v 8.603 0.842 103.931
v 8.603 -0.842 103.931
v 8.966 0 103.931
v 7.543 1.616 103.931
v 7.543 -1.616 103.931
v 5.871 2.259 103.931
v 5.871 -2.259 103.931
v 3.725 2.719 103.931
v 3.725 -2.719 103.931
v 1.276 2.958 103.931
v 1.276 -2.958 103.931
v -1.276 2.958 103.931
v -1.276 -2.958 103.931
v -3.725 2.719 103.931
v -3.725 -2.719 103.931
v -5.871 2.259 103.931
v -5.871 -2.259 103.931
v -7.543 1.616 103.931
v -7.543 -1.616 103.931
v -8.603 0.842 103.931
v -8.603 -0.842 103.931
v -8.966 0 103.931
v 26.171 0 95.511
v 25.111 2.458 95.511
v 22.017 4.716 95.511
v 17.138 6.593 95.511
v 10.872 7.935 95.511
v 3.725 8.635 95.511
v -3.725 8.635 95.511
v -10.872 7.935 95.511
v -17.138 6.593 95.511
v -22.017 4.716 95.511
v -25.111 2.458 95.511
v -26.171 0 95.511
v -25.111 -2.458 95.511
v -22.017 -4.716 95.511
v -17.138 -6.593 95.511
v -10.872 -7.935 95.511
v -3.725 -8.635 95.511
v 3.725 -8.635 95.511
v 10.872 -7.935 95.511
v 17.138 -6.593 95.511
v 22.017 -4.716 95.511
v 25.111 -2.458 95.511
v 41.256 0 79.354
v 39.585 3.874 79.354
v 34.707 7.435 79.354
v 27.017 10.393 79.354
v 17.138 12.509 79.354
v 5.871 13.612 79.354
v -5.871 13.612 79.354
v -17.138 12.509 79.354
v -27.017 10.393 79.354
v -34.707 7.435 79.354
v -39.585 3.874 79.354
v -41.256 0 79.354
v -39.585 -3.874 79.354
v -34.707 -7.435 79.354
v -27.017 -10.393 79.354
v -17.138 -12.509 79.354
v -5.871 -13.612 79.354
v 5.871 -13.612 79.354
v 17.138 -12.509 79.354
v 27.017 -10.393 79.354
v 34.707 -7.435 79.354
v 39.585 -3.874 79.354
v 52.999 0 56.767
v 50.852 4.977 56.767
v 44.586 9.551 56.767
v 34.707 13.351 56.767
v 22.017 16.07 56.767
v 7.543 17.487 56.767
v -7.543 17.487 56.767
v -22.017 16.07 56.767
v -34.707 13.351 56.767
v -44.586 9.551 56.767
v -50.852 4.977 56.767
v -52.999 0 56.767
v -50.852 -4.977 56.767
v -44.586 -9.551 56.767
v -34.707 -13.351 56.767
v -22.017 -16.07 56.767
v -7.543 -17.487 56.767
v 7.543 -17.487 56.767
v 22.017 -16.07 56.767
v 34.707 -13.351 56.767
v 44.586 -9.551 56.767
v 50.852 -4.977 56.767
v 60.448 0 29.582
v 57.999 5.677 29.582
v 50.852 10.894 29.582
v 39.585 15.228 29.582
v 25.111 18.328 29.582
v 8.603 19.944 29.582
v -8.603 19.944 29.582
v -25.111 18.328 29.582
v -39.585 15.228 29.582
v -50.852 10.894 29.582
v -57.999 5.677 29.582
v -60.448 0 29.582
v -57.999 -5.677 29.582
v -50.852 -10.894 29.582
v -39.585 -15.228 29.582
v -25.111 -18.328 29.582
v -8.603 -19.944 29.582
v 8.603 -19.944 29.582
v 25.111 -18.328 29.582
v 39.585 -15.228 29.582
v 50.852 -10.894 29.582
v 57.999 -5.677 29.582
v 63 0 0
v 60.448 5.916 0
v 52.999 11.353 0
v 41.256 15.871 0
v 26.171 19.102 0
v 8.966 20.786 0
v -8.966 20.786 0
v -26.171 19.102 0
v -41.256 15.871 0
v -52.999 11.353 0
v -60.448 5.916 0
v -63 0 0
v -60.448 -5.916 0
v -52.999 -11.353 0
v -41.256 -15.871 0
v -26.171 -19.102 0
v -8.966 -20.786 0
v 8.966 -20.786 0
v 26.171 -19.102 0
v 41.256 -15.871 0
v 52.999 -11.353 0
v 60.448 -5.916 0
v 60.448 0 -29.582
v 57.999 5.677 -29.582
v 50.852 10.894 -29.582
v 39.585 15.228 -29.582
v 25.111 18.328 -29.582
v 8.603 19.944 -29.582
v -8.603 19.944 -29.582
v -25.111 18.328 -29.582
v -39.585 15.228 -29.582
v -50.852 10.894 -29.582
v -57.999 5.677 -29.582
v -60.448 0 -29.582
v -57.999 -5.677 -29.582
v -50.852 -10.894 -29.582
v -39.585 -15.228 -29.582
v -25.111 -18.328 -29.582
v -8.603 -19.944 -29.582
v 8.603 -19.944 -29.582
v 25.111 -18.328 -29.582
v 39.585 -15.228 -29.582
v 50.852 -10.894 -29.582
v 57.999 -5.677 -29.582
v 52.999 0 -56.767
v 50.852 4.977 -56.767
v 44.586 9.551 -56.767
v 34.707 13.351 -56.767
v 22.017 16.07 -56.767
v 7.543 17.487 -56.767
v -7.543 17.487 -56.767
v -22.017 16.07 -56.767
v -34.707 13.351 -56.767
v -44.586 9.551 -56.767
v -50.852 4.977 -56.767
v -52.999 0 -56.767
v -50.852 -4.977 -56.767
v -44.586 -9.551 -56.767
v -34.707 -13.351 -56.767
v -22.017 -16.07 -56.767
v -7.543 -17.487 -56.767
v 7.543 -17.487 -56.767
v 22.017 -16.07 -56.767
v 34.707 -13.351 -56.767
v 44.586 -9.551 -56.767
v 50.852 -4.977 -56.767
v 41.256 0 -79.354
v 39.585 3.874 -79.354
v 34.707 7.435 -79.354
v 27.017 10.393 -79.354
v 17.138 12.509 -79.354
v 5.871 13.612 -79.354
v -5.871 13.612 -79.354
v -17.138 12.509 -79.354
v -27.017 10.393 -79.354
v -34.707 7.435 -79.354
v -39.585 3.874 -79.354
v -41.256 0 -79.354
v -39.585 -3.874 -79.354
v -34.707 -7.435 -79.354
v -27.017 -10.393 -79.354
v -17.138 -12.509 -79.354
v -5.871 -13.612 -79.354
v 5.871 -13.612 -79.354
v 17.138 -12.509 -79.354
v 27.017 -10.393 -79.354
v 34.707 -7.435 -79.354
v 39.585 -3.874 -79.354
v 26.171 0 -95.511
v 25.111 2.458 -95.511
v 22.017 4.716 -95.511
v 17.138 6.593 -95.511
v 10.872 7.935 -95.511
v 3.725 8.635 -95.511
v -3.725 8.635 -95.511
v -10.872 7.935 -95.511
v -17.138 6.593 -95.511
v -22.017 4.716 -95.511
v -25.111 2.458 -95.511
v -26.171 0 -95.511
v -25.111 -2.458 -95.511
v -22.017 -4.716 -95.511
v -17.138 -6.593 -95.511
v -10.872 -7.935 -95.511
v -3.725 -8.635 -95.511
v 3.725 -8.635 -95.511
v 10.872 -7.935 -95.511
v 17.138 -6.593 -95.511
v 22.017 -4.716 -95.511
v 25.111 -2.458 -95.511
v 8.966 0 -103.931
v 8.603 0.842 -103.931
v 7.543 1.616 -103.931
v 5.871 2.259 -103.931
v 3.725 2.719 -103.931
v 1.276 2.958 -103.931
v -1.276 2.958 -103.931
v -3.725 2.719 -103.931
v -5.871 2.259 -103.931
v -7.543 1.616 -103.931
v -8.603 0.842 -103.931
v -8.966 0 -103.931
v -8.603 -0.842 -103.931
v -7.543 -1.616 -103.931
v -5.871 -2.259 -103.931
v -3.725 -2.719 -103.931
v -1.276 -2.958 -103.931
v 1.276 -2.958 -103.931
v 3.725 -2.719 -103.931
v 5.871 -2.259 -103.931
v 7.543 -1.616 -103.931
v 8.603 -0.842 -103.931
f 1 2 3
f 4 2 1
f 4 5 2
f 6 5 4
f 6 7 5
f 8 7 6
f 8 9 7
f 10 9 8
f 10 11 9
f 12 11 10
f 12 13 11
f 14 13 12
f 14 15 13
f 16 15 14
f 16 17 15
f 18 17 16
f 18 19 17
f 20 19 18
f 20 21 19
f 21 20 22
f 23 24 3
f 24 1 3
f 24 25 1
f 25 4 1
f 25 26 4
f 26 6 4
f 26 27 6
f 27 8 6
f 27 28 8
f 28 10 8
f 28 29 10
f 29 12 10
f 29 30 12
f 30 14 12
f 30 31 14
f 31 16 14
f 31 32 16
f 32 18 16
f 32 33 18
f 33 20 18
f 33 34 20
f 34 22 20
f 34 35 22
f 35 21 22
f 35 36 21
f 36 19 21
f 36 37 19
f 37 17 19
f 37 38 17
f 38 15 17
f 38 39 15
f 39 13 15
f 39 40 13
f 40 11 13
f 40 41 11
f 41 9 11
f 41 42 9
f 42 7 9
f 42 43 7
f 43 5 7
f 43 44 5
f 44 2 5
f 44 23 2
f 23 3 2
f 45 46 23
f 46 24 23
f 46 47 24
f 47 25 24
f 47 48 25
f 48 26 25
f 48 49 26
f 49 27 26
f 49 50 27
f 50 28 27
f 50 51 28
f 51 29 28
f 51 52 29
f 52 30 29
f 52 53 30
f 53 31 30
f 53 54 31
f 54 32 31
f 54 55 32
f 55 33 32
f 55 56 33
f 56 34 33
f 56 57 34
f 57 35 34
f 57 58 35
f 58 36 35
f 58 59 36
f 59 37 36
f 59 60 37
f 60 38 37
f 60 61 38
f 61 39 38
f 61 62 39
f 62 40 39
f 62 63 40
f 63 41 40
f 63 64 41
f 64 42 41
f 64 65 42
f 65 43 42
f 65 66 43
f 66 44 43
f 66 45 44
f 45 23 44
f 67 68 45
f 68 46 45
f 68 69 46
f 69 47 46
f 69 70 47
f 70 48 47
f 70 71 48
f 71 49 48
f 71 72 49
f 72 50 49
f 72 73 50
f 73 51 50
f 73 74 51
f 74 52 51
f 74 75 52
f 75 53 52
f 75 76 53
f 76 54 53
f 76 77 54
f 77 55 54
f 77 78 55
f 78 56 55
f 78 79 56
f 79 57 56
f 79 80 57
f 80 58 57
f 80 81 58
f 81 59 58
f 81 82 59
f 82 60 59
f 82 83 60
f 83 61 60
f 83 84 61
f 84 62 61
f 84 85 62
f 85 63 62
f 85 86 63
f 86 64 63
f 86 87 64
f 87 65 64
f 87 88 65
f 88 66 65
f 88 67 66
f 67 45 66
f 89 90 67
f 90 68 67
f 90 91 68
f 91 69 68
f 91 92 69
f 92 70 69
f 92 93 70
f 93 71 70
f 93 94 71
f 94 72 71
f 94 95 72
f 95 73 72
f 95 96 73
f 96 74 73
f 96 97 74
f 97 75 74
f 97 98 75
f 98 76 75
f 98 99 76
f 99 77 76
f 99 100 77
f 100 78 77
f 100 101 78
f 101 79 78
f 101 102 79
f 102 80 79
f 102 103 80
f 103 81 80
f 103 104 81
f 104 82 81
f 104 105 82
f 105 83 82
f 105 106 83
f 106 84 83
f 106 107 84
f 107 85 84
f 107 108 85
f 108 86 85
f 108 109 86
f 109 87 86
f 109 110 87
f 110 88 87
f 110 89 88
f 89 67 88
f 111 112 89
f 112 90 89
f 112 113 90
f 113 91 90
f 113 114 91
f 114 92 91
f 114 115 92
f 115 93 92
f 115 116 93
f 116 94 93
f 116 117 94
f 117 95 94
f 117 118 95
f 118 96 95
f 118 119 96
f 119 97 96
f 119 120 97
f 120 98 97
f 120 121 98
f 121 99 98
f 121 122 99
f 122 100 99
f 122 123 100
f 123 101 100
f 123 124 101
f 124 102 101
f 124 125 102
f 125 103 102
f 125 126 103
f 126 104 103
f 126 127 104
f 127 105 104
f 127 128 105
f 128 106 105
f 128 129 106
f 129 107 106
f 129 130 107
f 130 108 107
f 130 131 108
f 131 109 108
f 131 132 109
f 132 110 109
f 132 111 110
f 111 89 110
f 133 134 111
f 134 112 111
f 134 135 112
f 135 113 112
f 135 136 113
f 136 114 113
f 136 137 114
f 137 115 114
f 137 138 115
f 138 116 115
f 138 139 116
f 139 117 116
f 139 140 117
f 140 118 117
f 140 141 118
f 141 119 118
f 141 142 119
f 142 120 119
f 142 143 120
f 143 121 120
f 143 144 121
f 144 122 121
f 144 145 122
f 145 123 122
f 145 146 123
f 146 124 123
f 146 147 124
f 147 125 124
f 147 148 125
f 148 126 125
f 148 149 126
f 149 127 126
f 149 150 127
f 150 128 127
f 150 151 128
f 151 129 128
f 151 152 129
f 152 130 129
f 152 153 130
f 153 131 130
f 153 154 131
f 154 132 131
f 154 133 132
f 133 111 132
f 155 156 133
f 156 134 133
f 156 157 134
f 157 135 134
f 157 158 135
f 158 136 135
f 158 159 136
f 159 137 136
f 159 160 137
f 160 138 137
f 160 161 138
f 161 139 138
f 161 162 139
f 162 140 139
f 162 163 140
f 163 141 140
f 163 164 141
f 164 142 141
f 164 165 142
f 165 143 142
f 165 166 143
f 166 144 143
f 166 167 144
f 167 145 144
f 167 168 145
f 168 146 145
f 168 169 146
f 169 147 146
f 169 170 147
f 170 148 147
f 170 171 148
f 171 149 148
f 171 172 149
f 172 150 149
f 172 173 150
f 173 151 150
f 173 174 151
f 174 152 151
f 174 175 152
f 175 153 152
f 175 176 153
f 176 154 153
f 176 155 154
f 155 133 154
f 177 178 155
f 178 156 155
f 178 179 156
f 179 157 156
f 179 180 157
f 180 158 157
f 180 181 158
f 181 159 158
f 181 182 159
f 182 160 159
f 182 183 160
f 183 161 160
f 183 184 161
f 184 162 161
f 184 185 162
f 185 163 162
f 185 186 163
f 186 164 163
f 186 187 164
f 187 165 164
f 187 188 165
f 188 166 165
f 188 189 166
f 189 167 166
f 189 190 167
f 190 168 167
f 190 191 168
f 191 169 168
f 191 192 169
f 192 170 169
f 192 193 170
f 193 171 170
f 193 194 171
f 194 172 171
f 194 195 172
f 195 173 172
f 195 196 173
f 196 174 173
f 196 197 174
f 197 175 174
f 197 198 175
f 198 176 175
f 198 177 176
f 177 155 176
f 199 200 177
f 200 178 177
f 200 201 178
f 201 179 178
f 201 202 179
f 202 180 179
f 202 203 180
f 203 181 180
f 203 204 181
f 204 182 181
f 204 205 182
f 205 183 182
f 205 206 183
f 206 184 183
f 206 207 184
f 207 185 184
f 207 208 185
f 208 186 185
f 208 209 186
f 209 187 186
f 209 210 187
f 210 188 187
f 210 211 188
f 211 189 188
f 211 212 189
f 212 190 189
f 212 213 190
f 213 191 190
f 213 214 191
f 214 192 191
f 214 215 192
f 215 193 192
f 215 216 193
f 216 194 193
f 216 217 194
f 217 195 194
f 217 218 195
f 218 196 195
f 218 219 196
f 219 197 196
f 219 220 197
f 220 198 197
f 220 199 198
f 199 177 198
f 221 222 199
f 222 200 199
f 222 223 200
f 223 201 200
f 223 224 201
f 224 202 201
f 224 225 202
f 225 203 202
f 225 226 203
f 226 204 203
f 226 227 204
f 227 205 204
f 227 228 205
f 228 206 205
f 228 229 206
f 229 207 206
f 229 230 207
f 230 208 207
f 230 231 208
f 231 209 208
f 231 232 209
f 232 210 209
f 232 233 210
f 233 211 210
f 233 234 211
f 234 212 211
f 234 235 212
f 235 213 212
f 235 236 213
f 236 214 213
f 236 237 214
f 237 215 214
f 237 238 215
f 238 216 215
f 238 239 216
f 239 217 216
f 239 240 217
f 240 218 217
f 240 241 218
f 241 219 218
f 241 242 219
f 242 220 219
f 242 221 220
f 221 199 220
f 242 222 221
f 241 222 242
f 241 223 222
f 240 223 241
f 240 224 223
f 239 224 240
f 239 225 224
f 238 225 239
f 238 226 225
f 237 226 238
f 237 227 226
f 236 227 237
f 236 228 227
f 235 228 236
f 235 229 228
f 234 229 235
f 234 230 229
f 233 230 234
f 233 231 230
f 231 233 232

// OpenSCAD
// Generated by SolidPython 1.0.1 on 2020-07-29 00:46:48


scale(v = [9, 3, 15]) {
	sphere(r = 7);
}
/***********************************************
*********      SolidPython code:      **********
************************************************
 
# import packages: SolidPython
from solid import *
from solid.utils import *
from itertools import chain, combinations, permutations


class Resize:

    def __init__(self, scad_file):
        self.scad_file = scad_file
        #self.scad_file = import_scad(scad_file)
        # cone/cylinder param:
        self.r1 = 0
        self.r2 = 0
        self.h = 0
        # rectangular prism param:
        self.w = 0
        self.l = 0
        # ellipse param:
        self.r = 0

    # import OpenScad code (file name corresponds to shape)


    # classify shape + parameters
    def assign(self, param1, param2, param3):
        if self.scad_file == 'cone.scad':
            self.r1 = param1
            self.r2 = param2
            self.h = param3
        elif self.scad_file == 'cylinder.scad':
            self.r1 = param1
            self.r2 = param2
            self.h = param3
        elif self.scad_file == 'rectangularPrism.scad':
            self.h = param1
            self.l = param2
            self.w = param3
        else:
            self.r = param1
            self.h = param2

    # resize parameters
    def iterate(self):
        x = range(3, 20, 2)
        i = 1
        if self.scad_file == 'cone.scad':
            tempList = list(permutations(x, 2))
            for temp in tempList:
                param1 = temp[0]
                param2 = temp[1]
                filepath = 'produced_scad_files/' + 'cone' + str(param1) + '_' + str(param2) + '_' + '.scad'
                scad_render_to_file(cylinder(h=param1, r1=param2, r2=0), filepath)

        elif self.scad_file == 'cylinder.scad':
            tempList = list(permutations(x, 3))
            for temp in tempList:
                param1 = temp[0]
                param2 = temp[1]
                filepath = 'produced_scad_files/' + 'cylinder' + str(param1) + '_' + str(param2) + '_' + '.scad'
                scad_render_to_file(cylinder(h=param1, r1=param2, r2=param2), filepath)

        elif self.scad_file == 'rectangularPrism.scad':
            tempList = list(permutations(x, 3))
            for temp in tempList:
                param1 = temp[0]
                param2 = temp[1]
                param3 = temp[2]
                filepath = 'produced_scad_files/' + 'rectangularPrism' + str(param1) + '_' + str(param2) + '_' + str(
                    param3) + '.scad'
                scad_render_to_file(cube(size=(param1, param2, param3)), filepath)

        elif self.scad_file == 'ellipse.scad':
            tempList = list(permutations(x, 4))
            for temp in tempList:
                param1 = temp[0]
                param2 = temp[1]
                param3 = temp[2]
                param4 = temp[3]
                filepath = 'produced_scad_files/' + 'ellipse' + str(param1) + '_' + str(param2) + '_' + str(param3) + '_' + str(param4) + '.scad'
                scad_render_to_file(scale([param1, param2, param3])(sphere(r=param4)), filepath)

    def render_to_scadfile(self):
        scad_render_to_file(scad, 'example.scad') 
 
************************************************/
